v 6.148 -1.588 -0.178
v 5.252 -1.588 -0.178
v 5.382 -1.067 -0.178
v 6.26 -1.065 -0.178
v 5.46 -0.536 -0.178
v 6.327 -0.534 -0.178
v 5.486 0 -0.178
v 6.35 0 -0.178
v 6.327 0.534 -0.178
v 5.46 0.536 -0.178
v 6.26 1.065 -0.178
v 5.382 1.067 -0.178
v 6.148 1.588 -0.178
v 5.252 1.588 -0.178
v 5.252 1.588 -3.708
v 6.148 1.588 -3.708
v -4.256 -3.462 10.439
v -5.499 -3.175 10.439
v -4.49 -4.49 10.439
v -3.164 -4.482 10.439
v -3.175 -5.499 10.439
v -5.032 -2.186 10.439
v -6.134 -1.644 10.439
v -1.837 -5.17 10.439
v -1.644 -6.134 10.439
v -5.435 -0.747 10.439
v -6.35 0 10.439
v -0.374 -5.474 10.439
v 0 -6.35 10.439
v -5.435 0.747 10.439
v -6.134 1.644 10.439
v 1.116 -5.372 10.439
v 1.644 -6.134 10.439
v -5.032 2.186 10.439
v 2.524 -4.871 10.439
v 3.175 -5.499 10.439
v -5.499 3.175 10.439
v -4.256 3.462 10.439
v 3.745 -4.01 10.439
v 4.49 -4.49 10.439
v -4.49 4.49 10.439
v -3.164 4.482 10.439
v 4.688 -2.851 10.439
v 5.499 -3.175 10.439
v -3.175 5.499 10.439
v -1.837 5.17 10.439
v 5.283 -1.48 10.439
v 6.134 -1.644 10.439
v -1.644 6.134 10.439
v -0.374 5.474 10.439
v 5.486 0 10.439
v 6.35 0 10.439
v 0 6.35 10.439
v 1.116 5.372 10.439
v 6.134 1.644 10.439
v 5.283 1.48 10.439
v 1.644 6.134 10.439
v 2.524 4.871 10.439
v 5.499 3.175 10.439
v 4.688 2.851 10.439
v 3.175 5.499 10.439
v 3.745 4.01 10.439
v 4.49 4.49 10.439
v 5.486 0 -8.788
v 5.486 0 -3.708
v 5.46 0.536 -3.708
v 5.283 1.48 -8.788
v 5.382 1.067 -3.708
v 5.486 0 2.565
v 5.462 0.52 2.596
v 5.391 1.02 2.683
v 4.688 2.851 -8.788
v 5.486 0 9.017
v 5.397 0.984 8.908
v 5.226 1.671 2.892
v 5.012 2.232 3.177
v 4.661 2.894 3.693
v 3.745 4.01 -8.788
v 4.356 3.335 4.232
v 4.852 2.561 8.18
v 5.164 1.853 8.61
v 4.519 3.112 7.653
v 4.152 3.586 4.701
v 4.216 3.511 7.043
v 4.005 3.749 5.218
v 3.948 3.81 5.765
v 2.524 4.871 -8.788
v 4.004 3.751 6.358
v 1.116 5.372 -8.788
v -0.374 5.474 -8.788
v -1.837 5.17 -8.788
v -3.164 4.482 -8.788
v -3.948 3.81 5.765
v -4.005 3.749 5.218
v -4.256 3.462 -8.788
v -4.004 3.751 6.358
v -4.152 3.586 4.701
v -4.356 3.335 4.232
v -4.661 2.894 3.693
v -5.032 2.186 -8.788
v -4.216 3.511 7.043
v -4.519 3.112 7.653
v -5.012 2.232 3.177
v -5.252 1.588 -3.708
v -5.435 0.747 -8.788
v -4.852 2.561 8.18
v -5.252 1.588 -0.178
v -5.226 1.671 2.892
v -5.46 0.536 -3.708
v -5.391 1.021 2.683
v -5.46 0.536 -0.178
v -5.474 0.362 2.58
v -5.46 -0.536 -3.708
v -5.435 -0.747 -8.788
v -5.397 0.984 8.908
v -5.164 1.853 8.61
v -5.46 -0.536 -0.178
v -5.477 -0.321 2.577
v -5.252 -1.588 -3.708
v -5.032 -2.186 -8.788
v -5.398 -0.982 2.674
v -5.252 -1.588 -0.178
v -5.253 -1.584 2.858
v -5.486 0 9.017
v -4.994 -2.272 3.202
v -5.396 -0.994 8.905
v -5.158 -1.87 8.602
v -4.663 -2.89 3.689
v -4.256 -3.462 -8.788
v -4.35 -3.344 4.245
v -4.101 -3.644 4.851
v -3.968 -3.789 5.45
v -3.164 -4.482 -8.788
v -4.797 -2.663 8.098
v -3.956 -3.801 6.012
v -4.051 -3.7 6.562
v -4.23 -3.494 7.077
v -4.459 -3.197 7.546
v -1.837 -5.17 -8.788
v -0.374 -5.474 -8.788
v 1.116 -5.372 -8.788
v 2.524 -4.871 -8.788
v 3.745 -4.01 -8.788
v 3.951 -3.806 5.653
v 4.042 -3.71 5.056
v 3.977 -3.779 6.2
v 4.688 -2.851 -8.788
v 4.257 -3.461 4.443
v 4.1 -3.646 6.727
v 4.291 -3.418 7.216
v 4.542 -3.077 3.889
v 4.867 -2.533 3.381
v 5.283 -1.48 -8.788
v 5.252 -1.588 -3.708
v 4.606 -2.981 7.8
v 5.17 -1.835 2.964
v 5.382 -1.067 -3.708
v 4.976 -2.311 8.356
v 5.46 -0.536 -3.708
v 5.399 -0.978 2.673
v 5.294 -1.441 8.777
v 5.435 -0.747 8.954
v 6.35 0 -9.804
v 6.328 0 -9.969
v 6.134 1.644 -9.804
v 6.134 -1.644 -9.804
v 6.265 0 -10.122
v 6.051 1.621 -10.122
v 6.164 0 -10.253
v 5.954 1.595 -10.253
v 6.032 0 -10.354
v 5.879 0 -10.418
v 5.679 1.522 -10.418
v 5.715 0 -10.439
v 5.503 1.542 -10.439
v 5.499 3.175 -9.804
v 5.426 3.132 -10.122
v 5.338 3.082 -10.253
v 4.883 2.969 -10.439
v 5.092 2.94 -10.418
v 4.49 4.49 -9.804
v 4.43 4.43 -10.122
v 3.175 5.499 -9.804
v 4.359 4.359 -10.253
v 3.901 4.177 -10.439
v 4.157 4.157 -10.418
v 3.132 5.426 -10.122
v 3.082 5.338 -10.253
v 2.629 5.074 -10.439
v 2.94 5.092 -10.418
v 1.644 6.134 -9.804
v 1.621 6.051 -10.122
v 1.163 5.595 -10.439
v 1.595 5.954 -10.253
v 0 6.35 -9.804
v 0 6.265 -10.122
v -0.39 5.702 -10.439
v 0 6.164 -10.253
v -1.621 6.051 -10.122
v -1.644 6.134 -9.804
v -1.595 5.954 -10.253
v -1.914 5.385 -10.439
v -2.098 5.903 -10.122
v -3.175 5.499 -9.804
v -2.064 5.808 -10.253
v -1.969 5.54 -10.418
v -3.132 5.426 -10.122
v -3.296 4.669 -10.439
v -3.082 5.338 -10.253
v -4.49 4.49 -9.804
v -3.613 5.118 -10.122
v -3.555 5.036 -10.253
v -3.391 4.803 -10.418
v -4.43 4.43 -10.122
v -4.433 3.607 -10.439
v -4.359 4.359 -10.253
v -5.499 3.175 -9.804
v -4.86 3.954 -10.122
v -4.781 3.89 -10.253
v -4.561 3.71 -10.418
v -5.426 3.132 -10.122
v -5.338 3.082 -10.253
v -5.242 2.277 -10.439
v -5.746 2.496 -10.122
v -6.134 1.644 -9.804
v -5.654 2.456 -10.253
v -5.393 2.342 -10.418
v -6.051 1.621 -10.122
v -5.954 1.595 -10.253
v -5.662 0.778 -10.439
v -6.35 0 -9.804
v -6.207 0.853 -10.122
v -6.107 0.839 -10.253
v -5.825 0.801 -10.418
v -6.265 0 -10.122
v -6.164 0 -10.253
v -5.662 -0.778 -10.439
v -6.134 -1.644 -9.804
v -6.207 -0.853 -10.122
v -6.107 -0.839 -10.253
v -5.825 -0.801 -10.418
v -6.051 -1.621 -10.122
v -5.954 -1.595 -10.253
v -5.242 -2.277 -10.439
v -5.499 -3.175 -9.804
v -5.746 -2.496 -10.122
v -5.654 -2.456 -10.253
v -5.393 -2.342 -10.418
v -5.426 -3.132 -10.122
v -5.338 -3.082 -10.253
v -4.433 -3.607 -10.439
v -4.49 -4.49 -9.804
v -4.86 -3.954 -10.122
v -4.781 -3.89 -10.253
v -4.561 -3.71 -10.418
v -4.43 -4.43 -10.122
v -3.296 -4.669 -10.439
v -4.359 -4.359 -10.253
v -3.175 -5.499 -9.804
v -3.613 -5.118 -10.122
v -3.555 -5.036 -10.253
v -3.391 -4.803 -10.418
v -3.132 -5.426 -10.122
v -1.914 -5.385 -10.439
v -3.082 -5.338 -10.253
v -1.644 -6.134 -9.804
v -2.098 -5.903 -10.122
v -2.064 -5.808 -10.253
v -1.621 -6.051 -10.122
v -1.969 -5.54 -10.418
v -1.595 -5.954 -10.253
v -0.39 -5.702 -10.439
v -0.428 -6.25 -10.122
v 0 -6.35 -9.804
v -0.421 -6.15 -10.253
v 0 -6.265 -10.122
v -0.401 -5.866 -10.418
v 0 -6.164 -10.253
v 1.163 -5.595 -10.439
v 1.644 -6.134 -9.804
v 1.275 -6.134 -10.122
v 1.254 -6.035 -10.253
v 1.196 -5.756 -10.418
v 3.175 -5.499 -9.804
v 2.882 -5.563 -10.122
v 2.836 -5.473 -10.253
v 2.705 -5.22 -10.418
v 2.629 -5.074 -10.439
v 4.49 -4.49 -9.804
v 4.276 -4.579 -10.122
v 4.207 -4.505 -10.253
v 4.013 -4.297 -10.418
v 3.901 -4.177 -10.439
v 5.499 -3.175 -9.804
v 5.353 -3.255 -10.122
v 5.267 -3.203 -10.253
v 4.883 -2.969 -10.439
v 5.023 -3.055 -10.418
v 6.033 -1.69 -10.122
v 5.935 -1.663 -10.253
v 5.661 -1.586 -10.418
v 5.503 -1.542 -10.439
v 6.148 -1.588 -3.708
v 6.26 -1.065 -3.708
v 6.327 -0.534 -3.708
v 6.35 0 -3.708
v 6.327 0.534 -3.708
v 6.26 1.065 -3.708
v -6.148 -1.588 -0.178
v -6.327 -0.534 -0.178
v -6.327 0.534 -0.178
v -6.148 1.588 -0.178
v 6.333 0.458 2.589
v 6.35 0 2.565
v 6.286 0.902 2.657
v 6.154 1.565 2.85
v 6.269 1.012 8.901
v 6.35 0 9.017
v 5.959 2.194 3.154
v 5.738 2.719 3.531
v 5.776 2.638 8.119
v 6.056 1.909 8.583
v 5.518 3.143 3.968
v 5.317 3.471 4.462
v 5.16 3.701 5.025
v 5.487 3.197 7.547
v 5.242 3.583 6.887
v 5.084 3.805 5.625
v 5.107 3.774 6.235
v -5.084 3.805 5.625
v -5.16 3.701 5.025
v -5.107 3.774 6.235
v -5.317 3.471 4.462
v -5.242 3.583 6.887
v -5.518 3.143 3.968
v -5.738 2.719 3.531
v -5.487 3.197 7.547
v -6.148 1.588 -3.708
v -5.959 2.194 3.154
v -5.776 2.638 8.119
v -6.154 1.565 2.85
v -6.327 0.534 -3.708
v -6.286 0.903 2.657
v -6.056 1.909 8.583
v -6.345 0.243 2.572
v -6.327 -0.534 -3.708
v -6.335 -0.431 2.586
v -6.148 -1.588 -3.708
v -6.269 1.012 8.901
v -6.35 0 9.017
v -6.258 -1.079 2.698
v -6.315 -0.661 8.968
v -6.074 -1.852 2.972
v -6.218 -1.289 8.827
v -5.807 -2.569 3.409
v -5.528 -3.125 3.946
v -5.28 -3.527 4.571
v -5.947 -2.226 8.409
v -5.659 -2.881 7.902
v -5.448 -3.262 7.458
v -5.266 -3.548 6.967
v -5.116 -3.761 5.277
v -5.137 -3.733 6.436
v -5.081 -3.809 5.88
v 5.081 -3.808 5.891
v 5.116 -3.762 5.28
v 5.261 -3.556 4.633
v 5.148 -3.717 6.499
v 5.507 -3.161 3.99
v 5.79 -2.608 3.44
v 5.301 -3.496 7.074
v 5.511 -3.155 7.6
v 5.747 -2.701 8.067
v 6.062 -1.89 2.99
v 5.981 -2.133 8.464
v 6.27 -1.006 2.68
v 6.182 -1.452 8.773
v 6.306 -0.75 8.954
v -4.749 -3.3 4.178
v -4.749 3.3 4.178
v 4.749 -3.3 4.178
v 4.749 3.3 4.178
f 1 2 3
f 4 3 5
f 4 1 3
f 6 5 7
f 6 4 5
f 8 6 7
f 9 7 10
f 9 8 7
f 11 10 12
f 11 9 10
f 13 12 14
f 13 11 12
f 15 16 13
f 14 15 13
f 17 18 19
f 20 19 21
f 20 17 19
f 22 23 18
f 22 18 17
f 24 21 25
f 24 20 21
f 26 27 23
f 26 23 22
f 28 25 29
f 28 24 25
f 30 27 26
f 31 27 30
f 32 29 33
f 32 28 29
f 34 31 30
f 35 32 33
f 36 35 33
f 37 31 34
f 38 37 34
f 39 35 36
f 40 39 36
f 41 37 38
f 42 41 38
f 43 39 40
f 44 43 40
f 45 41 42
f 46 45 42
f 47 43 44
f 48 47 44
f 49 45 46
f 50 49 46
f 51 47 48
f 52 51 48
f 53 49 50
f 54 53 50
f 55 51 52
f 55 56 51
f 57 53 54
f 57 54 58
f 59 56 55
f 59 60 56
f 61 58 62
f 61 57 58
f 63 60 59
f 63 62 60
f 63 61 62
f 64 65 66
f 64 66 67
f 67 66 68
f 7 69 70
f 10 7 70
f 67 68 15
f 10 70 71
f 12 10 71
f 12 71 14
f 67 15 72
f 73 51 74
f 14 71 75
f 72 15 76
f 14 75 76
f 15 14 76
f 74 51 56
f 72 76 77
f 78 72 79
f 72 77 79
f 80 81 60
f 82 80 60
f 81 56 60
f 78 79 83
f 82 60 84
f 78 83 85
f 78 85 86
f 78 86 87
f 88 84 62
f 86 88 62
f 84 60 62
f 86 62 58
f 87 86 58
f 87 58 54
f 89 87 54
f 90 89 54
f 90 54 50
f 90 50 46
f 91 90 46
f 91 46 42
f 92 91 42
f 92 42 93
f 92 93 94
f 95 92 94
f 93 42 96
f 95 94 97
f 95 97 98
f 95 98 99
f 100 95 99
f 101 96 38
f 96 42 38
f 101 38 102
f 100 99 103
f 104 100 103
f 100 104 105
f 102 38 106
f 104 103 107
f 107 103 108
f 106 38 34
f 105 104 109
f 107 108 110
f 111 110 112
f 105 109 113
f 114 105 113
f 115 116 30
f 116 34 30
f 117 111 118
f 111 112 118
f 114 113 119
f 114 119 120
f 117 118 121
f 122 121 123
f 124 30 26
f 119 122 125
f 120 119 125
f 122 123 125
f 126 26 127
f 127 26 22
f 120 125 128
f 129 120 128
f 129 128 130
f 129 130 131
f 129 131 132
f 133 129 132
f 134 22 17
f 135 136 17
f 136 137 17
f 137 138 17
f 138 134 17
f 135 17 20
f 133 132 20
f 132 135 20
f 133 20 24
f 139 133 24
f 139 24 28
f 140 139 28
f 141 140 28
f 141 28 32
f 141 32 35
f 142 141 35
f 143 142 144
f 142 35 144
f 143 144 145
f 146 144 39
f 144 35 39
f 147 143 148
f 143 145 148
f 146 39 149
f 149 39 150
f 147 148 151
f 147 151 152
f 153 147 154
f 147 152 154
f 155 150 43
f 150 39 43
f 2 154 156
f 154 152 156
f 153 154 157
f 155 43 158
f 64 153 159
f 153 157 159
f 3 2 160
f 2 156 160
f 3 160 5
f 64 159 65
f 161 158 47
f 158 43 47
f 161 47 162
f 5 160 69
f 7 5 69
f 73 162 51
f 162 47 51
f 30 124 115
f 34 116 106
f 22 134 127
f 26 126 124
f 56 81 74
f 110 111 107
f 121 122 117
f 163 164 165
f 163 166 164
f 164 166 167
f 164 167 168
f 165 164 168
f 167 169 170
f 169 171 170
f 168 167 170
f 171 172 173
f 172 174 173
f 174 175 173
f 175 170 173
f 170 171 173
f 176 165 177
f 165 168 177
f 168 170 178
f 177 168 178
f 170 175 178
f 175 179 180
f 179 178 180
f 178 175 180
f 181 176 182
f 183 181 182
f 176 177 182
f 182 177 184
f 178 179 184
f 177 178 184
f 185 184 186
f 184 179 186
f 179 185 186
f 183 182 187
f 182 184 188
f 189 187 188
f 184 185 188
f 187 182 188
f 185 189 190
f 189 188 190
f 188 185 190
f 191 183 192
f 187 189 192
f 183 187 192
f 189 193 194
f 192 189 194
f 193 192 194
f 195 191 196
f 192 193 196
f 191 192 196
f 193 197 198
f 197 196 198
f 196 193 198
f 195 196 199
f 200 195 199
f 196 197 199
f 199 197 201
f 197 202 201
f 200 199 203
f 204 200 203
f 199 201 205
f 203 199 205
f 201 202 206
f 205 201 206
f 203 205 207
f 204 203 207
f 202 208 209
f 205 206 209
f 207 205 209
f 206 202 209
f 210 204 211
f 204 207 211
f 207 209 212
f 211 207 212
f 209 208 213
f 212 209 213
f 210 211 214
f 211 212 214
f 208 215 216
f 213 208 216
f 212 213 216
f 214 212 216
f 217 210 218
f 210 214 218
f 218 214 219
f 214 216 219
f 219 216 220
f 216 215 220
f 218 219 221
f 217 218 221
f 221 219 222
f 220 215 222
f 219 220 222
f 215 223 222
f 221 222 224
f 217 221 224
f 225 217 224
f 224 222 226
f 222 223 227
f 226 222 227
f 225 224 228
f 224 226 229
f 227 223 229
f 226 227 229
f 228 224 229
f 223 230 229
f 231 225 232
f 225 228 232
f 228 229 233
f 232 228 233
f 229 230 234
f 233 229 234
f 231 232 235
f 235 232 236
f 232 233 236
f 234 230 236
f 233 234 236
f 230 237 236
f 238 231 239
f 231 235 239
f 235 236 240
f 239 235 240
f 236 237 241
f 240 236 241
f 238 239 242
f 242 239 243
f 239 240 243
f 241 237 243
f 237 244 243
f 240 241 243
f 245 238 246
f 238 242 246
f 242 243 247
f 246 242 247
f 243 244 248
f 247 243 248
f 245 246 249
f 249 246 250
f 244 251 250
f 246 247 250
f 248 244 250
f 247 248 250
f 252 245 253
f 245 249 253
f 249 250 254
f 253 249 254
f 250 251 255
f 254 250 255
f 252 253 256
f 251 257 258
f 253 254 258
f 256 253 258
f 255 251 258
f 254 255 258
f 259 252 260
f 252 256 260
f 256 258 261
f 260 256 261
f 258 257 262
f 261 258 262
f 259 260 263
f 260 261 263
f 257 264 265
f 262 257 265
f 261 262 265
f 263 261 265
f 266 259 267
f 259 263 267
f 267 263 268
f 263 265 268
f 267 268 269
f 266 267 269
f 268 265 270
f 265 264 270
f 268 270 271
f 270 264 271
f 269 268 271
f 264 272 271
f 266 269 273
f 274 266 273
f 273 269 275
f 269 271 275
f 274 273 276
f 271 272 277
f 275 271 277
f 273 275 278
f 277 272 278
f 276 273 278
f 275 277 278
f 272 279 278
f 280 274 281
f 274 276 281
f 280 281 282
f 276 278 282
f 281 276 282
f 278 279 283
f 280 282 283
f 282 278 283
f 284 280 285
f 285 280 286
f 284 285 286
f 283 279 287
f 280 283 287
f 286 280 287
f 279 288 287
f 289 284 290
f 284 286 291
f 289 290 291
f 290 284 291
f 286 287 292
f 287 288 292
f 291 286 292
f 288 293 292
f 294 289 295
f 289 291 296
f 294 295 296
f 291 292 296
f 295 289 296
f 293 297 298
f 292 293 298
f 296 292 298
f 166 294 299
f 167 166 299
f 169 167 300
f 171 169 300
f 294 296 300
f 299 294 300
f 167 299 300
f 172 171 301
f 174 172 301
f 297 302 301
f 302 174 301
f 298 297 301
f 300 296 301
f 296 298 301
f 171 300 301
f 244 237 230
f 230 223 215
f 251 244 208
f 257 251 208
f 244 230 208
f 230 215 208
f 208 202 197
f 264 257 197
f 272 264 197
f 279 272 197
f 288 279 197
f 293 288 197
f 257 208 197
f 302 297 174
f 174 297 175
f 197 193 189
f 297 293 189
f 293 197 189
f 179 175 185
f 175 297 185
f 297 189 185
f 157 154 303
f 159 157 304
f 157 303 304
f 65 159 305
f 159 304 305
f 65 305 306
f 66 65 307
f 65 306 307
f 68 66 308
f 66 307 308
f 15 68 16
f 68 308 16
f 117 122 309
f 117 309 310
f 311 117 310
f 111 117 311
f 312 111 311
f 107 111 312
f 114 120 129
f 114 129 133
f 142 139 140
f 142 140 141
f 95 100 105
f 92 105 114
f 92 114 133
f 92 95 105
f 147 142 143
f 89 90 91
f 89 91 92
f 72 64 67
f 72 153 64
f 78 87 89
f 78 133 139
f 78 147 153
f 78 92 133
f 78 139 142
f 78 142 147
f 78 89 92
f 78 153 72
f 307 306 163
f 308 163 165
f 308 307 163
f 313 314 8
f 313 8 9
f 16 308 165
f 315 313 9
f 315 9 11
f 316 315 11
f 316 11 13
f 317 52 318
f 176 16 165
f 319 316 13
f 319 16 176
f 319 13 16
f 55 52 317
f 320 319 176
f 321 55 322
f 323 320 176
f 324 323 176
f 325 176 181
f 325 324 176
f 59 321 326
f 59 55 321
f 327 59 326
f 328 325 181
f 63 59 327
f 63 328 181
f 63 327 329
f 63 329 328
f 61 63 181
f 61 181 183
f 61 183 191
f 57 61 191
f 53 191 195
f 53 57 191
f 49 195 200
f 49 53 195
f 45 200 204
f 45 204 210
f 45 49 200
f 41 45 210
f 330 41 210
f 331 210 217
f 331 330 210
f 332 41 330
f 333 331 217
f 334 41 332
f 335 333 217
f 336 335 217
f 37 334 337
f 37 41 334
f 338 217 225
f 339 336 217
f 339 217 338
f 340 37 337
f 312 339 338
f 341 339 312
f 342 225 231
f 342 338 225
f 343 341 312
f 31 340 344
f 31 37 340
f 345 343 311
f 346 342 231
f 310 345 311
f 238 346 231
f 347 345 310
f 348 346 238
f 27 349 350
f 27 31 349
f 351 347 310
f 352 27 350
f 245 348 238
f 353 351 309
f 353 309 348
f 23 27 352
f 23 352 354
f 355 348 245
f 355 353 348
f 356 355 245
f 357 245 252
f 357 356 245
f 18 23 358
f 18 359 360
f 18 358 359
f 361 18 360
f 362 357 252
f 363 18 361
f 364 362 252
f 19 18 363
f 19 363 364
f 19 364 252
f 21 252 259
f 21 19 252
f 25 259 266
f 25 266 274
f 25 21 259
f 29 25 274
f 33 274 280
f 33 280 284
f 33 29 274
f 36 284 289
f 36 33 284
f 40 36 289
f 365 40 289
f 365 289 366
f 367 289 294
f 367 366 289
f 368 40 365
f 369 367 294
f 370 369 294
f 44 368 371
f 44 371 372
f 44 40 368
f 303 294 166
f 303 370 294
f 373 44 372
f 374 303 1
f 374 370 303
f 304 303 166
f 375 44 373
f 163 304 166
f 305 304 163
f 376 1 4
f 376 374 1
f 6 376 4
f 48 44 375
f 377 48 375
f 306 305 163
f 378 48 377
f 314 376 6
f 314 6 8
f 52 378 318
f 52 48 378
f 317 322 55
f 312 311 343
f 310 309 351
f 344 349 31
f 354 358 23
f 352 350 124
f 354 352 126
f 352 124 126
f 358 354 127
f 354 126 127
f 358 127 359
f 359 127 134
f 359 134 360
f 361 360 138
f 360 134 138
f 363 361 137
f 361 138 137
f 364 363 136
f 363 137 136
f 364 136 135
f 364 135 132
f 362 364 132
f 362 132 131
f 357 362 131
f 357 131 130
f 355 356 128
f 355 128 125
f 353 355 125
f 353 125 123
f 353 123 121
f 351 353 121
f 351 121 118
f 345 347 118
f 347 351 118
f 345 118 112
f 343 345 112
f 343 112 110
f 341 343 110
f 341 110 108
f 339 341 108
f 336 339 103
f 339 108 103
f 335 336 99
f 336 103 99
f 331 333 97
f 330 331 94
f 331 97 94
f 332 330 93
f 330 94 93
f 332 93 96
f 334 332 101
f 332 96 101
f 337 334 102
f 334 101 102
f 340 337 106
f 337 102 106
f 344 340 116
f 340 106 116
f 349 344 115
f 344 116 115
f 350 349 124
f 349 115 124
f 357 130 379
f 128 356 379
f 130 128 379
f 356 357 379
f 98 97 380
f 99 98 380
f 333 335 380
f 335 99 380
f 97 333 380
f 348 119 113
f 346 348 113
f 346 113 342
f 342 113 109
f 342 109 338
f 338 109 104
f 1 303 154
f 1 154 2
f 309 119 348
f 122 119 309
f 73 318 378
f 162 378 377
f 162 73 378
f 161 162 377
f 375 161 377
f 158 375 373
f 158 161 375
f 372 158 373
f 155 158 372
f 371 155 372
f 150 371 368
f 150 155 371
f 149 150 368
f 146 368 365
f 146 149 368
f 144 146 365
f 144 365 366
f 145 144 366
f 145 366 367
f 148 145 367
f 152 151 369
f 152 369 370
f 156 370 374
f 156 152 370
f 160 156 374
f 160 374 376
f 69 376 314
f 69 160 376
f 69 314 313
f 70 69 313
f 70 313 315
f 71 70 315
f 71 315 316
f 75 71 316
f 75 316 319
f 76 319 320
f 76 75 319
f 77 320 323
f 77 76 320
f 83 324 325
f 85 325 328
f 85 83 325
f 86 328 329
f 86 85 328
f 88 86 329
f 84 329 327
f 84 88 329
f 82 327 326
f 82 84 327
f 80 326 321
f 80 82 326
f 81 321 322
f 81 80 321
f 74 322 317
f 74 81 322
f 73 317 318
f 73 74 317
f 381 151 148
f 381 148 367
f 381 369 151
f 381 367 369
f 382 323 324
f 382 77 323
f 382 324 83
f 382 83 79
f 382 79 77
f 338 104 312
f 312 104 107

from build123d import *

# Parameters (mm, degrees)
F0_R     = 6.35
F1_DEPTH = 10.4394
F2_R     = 5.4864
F3_DEPTH = 19.2278
F4_W     = 3.175
F4_H     = 3.5306
F5_DEPTH = 12.7
F7_DEPTH = 12.7
F8_R     = 0.635


with BuildPart() as f1:
    # F0 (on Top) → F1 (new body, symmetric)
    with BuildSketch(Plane.XY):
        Circle(F0_R)
    extrude(amount=F1_DEPTH, both=True)

    # F2 (on face) → F3 (cut)
    with BuildSketch(Plane.XY.offset(10.4394)):
        Circle(F2_R)
    extrude(amount=-F3_DEPTH, mode=Mode.SUBTRACT)

    # F4 (on Right) → F5 (cut, symmetric)
    with BuildSketch(Plane.YZ):
        with Locations((0, -1.9431)):
            Rectangle(F4_W, F4_H)
    extrude(amount=F5_DEPTH, both=True, mode=Mode.SUBTRACT)

    # F6 (on Right) → F7 (cut, symmetric)
    with BuildSketch(Plane.YZ):
        with BuildLine():
            add(Edge.make_bspline(
                [(0, 9.017), (-6.599114, 9.017), (-3.299557, 4.1783), (0, -0.6604), (3.299557, 4.1783), (6.599114, 9.017), (0, 9.017)],
                knots=[4.712389, 4.712389, 4.712389, 6.806784, 6.806784, 8.901179, 8.901179, 10.995574, 10.995574, 10.995574], degree=2, weights=[1, 0.5, 1, 0.5, 1, 0.5, 1]))
        make_face()
    extrude(amount=F7_DEPTH, both=True, mode=Mode.SUBTRACT)

    # F8
    f8_edges = [f1.edges().sort_by_distance(p)[0] for p in [
        (-6.35, 0, -10.4394),
    ]]
    fillet(f8_edges, radius=F8_R)


solid = f1.part
